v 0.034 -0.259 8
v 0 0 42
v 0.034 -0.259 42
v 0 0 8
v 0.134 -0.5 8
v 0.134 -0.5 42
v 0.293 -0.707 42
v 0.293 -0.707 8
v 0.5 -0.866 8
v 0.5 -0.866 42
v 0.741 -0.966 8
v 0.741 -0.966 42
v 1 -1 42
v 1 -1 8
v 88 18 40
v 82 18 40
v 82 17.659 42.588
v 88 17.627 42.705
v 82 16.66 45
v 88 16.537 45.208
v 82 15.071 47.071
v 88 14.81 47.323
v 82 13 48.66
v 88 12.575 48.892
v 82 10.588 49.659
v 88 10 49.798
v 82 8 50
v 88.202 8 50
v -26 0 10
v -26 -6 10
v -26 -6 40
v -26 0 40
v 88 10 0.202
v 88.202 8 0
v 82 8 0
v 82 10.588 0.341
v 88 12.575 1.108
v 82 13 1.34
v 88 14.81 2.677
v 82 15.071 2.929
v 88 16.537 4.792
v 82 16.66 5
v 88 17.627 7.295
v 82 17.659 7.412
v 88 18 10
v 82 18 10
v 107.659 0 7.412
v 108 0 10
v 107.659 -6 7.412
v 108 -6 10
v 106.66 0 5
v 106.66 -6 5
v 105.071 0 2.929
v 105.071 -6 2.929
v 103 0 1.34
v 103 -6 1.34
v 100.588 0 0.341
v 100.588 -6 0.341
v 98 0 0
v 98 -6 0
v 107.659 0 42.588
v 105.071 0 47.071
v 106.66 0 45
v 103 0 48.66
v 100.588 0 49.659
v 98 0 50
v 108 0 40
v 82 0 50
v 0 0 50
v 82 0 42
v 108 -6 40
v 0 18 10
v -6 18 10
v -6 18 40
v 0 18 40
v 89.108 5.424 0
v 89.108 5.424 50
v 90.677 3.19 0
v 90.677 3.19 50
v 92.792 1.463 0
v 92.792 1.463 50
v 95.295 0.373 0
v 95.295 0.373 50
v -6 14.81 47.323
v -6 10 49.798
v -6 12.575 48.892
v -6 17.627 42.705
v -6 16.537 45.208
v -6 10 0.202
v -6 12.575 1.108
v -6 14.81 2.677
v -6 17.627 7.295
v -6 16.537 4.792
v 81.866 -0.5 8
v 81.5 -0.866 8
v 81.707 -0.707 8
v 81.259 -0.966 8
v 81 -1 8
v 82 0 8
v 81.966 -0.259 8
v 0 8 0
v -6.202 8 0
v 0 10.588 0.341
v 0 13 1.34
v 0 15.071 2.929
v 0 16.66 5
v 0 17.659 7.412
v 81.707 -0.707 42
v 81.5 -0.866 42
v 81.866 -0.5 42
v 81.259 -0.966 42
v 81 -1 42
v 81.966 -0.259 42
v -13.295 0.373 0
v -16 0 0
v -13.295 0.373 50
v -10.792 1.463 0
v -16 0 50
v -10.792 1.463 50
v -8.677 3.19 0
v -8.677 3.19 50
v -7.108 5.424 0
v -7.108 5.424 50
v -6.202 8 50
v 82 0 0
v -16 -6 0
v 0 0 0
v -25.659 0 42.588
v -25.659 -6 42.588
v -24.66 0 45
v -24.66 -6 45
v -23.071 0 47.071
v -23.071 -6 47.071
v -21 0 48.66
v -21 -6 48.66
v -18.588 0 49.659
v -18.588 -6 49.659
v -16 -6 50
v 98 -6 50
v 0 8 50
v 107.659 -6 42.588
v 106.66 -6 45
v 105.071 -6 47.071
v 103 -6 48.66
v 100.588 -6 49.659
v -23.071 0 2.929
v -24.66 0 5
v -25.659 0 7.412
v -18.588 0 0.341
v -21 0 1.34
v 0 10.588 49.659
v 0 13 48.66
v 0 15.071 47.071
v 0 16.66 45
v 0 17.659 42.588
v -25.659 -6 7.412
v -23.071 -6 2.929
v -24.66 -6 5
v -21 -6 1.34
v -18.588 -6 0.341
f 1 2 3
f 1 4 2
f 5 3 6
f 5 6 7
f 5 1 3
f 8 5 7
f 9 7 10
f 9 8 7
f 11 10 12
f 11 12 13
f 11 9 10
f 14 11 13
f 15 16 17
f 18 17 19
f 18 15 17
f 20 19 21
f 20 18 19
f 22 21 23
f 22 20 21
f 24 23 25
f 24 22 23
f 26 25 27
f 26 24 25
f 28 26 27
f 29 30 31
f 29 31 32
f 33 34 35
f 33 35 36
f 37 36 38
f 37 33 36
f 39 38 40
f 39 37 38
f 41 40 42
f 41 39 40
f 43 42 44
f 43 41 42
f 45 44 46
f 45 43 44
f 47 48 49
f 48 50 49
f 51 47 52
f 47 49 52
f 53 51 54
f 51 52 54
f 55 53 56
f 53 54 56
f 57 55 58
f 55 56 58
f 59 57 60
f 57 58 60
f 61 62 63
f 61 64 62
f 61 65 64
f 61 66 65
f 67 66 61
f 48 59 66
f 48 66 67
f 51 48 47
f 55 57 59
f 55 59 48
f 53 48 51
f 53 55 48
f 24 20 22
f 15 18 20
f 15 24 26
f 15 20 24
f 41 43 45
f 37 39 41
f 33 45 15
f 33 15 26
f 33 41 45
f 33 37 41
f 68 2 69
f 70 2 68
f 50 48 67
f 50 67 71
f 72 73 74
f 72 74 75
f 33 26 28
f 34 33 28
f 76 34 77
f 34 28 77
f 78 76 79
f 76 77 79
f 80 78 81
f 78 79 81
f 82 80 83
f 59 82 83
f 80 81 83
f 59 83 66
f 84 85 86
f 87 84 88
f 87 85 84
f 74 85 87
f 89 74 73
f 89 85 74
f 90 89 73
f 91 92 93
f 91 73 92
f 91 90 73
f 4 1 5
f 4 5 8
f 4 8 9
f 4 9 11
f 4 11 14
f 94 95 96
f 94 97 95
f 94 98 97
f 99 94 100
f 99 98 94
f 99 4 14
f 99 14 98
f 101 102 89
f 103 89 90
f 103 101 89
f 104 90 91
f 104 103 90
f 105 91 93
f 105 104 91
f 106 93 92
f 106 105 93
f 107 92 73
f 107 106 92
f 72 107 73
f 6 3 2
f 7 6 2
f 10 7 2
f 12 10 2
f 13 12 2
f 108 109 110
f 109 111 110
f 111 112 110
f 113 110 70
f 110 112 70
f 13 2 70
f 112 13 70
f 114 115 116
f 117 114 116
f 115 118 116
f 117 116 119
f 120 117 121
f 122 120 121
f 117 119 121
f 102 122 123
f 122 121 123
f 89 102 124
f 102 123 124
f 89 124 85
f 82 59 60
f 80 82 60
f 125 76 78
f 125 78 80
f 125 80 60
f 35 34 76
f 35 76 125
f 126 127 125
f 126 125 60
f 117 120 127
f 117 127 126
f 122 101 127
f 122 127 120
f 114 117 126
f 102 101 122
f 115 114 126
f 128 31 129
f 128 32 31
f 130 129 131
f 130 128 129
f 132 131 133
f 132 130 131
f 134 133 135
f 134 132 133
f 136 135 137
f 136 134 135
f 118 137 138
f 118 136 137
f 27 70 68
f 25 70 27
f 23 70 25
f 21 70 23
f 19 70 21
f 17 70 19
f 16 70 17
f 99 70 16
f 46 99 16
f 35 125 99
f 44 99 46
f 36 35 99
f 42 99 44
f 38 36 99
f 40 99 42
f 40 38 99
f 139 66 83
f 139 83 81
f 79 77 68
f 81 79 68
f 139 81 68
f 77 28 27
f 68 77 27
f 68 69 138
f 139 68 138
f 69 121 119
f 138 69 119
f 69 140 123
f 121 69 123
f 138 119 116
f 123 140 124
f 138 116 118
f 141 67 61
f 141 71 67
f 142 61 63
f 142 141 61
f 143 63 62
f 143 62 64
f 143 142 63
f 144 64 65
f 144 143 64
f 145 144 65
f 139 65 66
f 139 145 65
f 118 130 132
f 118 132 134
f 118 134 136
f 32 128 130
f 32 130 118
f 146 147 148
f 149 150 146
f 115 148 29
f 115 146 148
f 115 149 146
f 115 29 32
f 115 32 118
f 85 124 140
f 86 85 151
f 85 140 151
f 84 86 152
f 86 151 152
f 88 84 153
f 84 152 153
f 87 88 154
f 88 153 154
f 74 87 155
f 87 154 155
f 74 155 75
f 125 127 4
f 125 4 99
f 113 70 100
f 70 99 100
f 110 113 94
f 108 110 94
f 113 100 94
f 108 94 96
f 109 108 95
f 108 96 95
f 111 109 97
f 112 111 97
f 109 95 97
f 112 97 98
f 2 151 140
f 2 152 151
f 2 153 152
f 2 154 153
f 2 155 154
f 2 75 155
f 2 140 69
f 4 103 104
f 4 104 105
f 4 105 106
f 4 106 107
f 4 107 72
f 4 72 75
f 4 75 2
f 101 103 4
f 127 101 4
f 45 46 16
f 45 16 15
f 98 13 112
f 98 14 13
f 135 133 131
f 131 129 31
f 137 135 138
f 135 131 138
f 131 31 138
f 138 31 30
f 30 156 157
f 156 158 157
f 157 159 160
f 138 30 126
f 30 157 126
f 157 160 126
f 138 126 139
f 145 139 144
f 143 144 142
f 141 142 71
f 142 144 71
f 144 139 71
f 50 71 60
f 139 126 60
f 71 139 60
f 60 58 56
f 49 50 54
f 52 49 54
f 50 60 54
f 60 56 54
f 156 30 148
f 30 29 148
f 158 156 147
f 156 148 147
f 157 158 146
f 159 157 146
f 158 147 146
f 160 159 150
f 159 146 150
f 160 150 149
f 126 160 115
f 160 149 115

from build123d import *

# Parameters (mm, degrees)
BOSS_EXTRUDE1_DEPTH = 50
FILLET1_R           = 10
FILLET2_R           = 10
SKETCH2_W           = 82
SKETCH2_H           = 34
CUT_EXTRUDE1_DEPTH  = 1
FILLET3_R           = 1


with BuildPart() as part:
    # Sketch1 → Boss-Extrude1 (new body)
    with BuildSketch(Plane.XY):
        Polygon((0, 0), (82, 0), (82, 18), (88, 18), (88, 0), (108, 0), (108, -6), (0, -6), (-6, -6), (-26, -6), (-26, 0), (-6, 0), (-6, 18), (0, 18), align=None)
    extrude(amount=BOSS_EXTRUDE1_DEPTH)

    # Fillet1
    fillet1_edges = [part.edges().sort_by_distance(p)[0] for p in [
        (88, 0, 25),
        (-6, 0, 25),
        (108, -3, 0),
        (108, -3, 50),
        (-26, -3, 0),
        (-26, -3, 50),
    ]]
    fillet(fillet1_edges, radius=FILLET1_R - 0.0001)  # a hair under: the kernel refuses the full size

    # Fillet2
    fillet2_edges = [part.edges().sort_by_distance(p)[0] for p in [
        (85, 18, 50),
        (85, 18, 0),
        (-3, 18, 0),
        (-3, 18, 50),
    ]]
    fillet(fillet2_edges, radius=FILLET2_R)

    # Sketch2 → Cut-Extrude1 (cut)
    with BuildSketch(Plane(origin=(0, 0, 0), x_dir=(1, 0, 0), z_dir=(0, 1, 0))):
        with Locations((41, -25)):
            Rectangle(SKETCH2_W, SKETCH2_H)
    extrude(amount=-CUT_EXTRUDE1_DEPTH, mode=Mode.SUBTRACT)

    # Fillet3
    fillet3_edges = [part.edges().sort_by_distance(p)[0] for p in [
        (82, -1, 25),
        (0, -1, 25),
    ]]
    fillet(fillet3_edges, radius=FILLET3_R)


solid = part.part
